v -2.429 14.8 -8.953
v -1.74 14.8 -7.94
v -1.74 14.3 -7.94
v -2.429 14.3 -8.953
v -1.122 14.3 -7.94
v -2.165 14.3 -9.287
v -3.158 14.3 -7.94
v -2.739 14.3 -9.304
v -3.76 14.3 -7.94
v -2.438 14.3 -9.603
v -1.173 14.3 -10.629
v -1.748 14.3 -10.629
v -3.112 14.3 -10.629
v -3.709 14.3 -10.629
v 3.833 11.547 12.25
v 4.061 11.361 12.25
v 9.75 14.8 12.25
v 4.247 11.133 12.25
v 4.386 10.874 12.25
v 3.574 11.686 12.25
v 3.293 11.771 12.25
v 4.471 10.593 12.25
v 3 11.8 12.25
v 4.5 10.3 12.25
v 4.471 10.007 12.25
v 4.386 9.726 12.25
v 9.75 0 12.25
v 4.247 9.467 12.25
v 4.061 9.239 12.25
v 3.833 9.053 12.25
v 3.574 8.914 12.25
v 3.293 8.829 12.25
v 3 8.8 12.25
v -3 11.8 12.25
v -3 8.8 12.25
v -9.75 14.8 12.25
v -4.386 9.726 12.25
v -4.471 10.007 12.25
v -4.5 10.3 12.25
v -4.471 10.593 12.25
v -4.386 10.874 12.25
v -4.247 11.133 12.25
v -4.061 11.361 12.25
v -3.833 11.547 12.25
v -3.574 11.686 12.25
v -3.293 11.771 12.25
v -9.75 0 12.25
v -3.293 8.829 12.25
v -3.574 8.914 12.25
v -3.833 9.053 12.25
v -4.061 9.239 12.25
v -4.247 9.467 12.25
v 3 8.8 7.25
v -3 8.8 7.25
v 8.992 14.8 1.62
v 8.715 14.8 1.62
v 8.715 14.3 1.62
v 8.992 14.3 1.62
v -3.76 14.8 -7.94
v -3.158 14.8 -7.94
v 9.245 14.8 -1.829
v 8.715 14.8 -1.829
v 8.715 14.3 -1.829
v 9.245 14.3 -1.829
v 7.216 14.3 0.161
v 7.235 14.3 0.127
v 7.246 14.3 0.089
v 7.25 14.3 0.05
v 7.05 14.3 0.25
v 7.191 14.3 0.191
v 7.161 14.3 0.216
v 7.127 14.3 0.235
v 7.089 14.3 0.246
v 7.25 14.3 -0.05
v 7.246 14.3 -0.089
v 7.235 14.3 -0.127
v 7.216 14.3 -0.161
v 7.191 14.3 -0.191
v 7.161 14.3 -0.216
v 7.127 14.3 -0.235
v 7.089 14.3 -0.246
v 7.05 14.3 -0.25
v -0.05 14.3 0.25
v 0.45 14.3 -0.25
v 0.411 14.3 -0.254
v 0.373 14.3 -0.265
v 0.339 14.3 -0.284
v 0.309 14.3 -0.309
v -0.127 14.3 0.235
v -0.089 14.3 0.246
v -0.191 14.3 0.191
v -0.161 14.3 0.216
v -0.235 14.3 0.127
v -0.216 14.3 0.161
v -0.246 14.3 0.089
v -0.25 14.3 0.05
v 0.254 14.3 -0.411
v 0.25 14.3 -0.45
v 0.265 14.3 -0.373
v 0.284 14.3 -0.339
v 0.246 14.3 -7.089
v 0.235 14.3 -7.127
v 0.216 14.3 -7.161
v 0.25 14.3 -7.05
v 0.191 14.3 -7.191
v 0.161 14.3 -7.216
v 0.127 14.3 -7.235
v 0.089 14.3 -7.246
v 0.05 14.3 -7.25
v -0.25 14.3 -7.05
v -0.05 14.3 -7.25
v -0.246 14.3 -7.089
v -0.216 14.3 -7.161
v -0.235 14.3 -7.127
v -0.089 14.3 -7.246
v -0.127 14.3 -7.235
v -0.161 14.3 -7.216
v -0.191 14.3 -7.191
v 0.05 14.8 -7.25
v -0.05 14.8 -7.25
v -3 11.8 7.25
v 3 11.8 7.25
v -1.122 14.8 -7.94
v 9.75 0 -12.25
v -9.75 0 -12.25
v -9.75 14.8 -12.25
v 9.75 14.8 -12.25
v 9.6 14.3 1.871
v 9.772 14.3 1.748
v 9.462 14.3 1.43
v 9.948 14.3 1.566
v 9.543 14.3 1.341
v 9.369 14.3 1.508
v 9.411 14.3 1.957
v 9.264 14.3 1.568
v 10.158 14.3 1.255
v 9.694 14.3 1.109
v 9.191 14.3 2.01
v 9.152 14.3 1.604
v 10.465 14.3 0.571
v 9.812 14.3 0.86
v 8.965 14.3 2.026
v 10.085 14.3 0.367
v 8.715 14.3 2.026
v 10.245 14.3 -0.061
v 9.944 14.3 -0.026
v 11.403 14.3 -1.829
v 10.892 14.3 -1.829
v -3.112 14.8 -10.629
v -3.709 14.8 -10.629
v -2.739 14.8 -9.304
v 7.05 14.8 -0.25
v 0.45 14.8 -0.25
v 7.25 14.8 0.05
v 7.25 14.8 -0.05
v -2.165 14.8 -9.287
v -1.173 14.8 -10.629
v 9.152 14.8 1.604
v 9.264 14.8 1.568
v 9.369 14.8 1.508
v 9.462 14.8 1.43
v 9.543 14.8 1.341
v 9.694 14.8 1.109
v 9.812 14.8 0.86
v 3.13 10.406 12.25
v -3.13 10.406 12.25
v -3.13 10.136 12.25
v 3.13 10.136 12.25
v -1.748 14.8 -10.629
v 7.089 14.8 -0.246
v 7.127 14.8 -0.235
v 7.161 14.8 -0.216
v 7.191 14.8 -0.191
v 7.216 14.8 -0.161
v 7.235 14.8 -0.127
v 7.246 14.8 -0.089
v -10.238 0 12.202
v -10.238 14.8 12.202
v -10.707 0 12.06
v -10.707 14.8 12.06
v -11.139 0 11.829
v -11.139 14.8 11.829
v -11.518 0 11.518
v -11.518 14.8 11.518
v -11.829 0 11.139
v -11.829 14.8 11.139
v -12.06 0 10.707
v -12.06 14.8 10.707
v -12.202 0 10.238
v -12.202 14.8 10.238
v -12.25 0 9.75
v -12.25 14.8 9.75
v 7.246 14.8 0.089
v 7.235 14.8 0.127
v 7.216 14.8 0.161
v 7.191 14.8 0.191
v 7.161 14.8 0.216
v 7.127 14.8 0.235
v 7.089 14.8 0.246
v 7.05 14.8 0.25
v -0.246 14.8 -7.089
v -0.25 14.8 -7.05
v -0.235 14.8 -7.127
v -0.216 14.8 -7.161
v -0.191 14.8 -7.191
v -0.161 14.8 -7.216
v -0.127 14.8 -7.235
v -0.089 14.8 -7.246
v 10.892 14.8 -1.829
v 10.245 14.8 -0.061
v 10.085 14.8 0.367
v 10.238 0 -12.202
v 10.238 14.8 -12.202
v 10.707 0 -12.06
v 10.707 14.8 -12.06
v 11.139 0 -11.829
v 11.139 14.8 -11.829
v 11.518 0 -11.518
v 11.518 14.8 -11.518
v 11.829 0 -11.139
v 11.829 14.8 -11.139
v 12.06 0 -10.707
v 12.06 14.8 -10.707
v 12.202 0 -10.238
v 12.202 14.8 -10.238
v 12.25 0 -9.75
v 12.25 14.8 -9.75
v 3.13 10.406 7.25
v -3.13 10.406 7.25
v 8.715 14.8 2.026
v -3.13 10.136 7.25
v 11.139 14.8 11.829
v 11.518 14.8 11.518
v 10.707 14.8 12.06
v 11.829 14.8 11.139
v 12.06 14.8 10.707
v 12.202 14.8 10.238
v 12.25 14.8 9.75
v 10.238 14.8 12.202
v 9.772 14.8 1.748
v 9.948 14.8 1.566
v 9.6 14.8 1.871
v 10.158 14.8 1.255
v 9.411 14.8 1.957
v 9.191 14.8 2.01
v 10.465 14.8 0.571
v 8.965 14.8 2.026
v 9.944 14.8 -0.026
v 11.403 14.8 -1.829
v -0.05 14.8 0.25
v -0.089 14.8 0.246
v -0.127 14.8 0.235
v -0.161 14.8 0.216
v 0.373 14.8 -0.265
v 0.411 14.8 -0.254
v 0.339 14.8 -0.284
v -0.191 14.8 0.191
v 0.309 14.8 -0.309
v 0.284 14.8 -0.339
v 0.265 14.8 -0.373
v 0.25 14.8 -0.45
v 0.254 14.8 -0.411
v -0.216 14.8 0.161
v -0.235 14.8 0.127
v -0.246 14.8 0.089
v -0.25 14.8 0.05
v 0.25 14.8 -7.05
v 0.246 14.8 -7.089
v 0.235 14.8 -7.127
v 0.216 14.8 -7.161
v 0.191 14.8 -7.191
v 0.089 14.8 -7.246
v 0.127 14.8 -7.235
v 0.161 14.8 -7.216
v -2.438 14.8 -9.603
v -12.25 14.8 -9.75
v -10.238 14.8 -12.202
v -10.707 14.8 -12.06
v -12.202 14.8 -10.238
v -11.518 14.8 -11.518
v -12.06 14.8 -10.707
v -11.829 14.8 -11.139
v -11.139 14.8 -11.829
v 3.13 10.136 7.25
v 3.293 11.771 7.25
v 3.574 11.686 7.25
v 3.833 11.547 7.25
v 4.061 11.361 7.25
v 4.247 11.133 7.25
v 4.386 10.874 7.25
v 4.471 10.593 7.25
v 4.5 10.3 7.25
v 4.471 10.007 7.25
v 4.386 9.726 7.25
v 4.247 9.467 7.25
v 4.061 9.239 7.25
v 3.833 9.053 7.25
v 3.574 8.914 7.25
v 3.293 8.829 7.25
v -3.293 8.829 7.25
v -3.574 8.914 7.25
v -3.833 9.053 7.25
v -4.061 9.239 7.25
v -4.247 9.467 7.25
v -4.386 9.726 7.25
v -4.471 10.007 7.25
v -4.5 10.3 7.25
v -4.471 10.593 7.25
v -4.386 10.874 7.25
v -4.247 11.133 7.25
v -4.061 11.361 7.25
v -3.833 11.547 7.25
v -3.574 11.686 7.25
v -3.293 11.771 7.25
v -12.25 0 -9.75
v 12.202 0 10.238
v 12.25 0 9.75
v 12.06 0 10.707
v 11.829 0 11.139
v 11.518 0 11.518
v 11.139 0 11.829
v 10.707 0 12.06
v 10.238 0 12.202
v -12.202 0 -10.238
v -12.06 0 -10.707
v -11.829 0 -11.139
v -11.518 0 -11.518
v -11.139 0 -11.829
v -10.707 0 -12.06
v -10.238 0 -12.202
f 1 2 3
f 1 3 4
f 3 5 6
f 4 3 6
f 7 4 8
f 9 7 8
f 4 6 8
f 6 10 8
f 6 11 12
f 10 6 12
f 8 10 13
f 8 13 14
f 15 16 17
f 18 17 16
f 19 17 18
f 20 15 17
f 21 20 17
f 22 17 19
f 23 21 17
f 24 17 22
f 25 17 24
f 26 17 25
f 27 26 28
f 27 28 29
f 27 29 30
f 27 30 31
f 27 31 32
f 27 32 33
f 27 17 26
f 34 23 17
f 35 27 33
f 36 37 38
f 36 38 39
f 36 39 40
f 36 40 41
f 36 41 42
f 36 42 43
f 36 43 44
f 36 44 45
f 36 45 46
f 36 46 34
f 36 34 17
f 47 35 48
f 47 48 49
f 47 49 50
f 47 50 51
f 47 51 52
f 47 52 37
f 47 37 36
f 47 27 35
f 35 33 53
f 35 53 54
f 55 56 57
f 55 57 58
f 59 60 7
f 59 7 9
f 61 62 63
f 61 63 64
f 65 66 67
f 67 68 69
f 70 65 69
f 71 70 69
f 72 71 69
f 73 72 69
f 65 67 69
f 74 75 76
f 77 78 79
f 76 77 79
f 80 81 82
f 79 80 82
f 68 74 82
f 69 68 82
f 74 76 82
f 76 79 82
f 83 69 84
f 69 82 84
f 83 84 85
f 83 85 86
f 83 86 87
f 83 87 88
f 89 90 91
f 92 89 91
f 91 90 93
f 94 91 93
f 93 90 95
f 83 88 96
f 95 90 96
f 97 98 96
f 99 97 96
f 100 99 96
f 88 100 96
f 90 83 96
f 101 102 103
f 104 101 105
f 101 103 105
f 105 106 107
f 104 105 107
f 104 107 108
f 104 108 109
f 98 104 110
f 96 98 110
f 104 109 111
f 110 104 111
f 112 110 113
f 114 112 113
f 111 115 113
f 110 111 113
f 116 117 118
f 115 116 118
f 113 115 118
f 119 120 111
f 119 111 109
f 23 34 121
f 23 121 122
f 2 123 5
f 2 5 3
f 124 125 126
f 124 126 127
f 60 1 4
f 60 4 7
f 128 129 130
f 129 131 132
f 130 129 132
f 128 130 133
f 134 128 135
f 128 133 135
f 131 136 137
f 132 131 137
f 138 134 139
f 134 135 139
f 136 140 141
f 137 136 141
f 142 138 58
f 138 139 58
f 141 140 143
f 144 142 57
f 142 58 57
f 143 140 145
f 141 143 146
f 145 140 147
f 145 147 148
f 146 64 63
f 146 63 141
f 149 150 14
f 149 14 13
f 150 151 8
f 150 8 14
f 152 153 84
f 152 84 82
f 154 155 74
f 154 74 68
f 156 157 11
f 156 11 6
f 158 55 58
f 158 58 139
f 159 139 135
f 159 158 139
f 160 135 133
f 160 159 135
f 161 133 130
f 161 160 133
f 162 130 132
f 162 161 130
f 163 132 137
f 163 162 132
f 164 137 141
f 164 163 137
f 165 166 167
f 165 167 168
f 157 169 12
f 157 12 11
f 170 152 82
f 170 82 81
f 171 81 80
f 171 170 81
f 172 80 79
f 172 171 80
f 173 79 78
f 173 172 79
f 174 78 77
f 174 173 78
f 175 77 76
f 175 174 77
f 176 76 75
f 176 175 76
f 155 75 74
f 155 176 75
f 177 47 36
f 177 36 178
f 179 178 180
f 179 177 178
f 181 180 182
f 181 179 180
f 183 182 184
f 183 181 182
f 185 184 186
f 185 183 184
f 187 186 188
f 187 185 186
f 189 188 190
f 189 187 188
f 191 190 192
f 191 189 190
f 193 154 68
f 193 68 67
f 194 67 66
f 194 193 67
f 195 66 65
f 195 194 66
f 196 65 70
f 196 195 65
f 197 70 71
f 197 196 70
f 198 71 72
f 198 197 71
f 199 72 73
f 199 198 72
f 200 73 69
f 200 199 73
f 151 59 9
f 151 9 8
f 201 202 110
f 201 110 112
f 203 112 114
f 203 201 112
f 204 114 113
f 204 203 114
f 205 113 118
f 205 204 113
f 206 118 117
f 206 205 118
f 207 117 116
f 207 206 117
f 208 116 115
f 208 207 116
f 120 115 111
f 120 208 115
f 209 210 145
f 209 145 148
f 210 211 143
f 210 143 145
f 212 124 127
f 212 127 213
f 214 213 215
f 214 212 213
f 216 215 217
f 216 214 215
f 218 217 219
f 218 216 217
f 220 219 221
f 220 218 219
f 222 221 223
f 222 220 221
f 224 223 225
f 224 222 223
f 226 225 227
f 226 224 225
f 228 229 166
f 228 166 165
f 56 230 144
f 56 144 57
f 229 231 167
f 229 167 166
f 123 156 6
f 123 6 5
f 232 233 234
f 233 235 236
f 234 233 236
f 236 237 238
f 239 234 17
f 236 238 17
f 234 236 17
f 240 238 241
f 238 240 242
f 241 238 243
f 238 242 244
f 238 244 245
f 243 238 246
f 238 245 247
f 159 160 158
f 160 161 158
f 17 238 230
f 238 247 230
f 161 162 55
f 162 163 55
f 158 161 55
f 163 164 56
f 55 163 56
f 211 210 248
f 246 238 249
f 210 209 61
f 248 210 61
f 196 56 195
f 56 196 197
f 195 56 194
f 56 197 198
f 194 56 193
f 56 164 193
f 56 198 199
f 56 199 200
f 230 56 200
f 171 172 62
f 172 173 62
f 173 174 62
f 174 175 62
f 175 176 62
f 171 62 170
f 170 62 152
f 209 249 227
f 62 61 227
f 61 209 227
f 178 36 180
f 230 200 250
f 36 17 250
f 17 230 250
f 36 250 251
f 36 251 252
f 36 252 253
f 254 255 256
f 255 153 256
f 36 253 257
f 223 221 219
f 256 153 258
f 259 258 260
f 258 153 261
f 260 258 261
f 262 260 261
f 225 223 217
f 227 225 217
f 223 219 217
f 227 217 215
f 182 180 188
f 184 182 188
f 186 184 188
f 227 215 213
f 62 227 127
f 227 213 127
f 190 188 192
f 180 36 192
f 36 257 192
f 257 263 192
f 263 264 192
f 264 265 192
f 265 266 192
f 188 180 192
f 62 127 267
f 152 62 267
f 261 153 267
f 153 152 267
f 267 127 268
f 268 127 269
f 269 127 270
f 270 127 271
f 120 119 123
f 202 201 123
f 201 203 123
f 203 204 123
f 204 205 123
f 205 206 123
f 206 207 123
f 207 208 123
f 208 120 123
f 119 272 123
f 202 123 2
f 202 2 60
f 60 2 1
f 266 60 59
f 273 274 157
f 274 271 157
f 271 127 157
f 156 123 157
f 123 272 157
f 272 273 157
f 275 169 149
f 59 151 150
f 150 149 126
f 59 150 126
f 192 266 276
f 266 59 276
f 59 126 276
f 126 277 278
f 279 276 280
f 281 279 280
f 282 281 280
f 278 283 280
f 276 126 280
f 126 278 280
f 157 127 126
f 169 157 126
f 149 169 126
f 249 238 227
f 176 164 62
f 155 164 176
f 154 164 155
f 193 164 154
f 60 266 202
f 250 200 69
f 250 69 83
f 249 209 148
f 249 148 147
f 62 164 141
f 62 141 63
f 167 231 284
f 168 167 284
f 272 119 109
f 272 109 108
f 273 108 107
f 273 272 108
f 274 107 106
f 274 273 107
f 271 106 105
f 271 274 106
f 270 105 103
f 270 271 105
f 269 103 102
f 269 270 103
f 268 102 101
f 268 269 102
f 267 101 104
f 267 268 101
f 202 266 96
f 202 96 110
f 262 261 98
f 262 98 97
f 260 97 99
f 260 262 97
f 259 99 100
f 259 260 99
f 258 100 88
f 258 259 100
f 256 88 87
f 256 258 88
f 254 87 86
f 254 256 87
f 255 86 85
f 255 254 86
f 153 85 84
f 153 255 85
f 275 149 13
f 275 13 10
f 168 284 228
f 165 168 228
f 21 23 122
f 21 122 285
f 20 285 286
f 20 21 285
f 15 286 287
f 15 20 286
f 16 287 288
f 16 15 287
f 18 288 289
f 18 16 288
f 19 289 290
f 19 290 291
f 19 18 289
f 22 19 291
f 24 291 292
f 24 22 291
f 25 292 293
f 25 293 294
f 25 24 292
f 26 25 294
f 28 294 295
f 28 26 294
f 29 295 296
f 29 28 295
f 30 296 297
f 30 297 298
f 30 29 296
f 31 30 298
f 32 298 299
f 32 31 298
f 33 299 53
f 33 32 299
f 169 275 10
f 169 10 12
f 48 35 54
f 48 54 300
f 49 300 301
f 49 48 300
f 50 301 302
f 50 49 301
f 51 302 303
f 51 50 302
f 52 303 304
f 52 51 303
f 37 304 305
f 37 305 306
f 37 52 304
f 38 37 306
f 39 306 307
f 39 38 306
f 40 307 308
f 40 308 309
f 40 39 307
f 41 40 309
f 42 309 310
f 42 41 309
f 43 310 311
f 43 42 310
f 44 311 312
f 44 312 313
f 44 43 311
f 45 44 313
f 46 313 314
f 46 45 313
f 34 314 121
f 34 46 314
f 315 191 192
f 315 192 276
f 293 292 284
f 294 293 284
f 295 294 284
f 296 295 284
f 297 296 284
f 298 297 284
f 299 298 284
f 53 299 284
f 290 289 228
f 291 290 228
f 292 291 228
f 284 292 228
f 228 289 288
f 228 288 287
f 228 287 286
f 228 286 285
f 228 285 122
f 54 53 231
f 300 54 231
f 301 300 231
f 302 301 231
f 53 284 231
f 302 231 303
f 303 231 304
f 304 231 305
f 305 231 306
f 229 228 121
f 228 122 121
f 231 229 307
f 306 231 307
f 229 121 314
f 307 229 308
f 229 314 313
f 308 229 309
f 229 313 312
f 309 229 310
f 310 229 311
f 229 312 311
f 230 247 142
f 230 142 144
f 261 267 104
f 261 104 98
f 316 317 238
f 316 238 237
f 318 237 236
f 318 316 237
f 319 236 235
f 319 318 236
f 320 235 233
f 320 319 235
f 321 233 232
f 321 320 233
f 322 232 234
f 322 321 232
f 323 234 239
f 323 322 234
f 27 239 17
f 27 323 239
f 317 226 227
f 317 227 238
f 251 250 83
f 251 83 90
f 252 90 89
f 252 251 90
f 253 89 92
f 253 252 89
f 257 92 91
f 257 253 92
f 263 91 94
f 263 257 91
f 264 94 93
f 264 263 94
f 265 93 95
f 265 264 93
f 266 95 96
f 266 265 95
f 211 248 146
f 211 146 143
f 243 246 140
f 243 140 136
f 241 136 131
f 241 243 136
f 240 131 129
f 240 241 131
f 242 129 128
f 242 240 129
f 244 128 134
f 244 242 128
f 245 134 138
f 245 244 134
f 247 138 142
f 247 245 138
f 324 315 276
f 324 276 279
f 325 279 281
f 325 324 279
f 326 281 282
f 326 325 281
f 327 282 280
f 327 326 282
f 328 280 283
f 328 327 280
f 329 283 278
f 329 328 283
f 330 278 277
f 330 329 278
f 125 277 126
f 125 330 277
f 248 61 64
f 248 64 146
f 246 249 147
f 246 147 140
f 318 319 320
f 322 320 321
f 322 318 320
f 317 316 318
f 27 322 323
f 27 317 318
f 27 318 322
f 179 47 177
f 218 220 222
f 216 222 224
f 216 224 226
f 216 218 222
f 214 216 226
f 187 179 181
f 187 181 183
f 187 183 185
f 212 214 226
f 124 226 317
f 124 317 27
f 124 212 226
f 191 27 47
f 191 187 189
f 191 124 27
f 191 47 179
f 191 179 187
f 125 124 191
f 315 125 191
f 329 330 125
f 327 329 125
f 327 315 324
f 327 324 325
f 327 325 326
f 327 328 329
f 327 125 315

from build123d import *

# Parameters (mm, degrees)
EXTRUDE_1_DEPTH     = 14.8
CUT_EXTRUDE_1_DEPTH = 0.5
CUT_EXTRUDE_2_DEPTH = 0.5
CUT_EXTRUDE_3_DEPTH = 0.5
CUT_EXTRUDE_4_DEPTH = 5
SKETCH_6_W          = 6.25953497
SKETCH_6_H          = 0.270195754
EXTRUDE_2_DEPTH     = 5


with BuildPart() as part:
    # 草图1 → 凸台-拉伸1 (new body)
    with BuildSketch(Plane(origin=(0, 0, 0), x_dir=(1, 0, 0), z_dir=(0, 1, 0))):
        with BuildLine():
            Line((-9.75, 12.25), (9.75, 12.25))
            ThreePointArc((9.75, 12.25), (11.517766953, 11.517766953), (12.25, 9.75))
            Line((12.25, 9.75), (12.25, -9.75))
            ThreePointArc((12.25, -9.75), (11.517766953, -11.517766953), (9.75, -12.25))
            Line((9.75, -12.25), (-9.75, -12.25))
            ThreePointArc((-9.75, -12.25), (-11.517766953, -11.517766953), (-12.25, -9.75))
            Line((-12.25, -9.75), (-12.25, 9.75))
            ThreePointArc((-12.25, 9.75), (-11.517766953, 11.517766953), (-9.75, 12.25))
        make_face()
    extrude(amount=EXTRUDE_1_DEPTH)

    # 草图2 → 切除-拉伸1 (cut)
    with BuildSketch(Plane(origin=(0, 14.8, 0), x_dir=(1, 0, 0), z_dir=(0, 1, 0))):
        with BuildLine():
            Line((-0.25, -0.05), (-0.25, 7.05))
            ThreePointArc((-0.25, 7.05), (-0.191421356, 7.191421356), (-0.05, 7.25))
            Line((-0.05, 7.25), (0.05, 7.25))
            ThreePointArc((0.05, 7.25), (0.191421356, 7.191421356), (0.25, 7.05))
            Line((0.25, 7.05), (0.25, 0.45))
            ThreePointArc((0.25, 0.45), (0.308578644, 0.308578644), (0.45, 0.25))
            Line((0.45, 0.25), (7.05, 0.25))
            ThreePointArc((7.05, 0.25), (7.191421356, 0.191421356), (7.25, 0.05))
            Line((7.25, 0.05), (7.25, -0.05))
            ThreePointArc((7.25, -0.05), (7.191421356, -0.191421356), (7.05, -0.25))
            Line((7.05, -0.25), (-0.05, -0.25))
            ThreePointArc((-0.05, -0.25), (-0.191421356, -0.191421356), (-0.25, -0.05))
        make_face()
    extrude(amount=-CUT_EXTRUDE_1_DEPTH, mode=Mode.SUBTRACT)

    # 草图3 → 切除-拉伸2 (cut)
    with BuildSketch(Plane(origin=(0, 14.8, 0), x_dir=(1, 0, 0), z_dir=(0, 1, 0))):
        Polygon((-1.12229135, 7.940311498), (-1.739705299, 7.940311498), (-2.429243342, 8.953219107), (-3.157617436, 7.940311498), (-3.759972509, 7.940311498), (-2.739139176, 9.303536136), (-3.709247871, 10.628717295), (-3.112440806, 10.628717295), (-2.437961639, 9.603128527), (-1.747631023, 10.628717295), (-1.173015987, 10.628717295), (-2.164524139, 9.286892114), align=None)
    extrude(amount=-CUT_EXTRUDE_2_DEPTH, mode=Mode.SUBTRACT)

    # 草图4 → 切除-拉伸3 (cut)
    with BuildSketch(Plane(origin=(0, 14.8, 0), x_dir=(1, 0, 0), z_dir=(0, 1, 0))):
        with BuildLine():
            Line((11.403475674, 1.828812442), (10.465069877, -0.571096978))
            add(Edge.make_bspline(
                [(10.465069877, -0.571096978), (10.441698651, -0.632813146), (10.396273738, -0.752766273), (10.323476502, -0.924688355), (10.248962895, -1.083206918), (10.173859339, -1.229075957), (10.096249765, -1.36191233), (10.015608226, -1.4823536), (9.930382332, -1.589561424), (9.842668967, -1.685533109), (9.749809923, -1.768599434), (9.653342166, -1.840372882), (9.551769454, -1.8996192), (9.445588671, -1.946527543), (9.334028283, -1.98269443), (9.216553101, -2.007284146), (9.092822913, -2.024191262), (9.008117337, -2.025559298), (8.964730203, -2.026260022)],
                knots=[0, 0, 0, 0, 0.000197967, 0.000384774, 0.000559923, 0.000723343, 0.00087681, 0.001021234, 0.001157764, 0.001287322, 0.001410801, 0.001530959, 0.001647456, 0.001762775, 0.001878572, 0.001998583, 0.00212245, 0.002252519, 0.002252519, 0.002252519, 0.002252519], degree=3))
            add(Edge.make_bspline(
                [(8.964730203, -2.026260022), (8.942538174, -2.026260022), (8.900531833, -2.026260022), (8.838975372, -2.026260022), (8.777947292, -2.026260022), (8.736733524, -2.026260022), (8.715069877, -2.026260022)],
                knots=[0, 0, 0, 0, 6.6576e-05, 0.000126019, 0.000184669, 0.00024966, 0.00024966, 0.00024966, 0.00024966], degree=3))
            Line((8.715069877, -2.026260022), (8.715069877, -1.62046292))
            add(Edge.make_bspline(
                [(8.715069877, -1.62046292), (8.735676761, -1.62046292), (8.778739865, -1.62046292), (8.845844333, -1.62046292), (8.917440046, -1.62046292), (8.966579539, -1.62046292), (8.991677667, -1.62046292)],
                knots=[0, 0, 0, 0, 6.1821e-05, 0.000129189, 0.000201313, 0.000276608, 0.000276608, 0.000276608, 0.000276608], degree=3))
            add(Edge.make_bspline(
                [(8.991677667, -1.62046292), (9.033605397, -1.618534602), (9.115432431, -1.614771255), (9.214758532, -1.588635211), (9.288887696, -1.557320953), (9.342163605, -1.526264237), (9.395038901, -1.491140236), (9.444860635, -1.447343482), (9.494119782, -1.39811915), (9.542666617, -1.342303846), (9.589955098, -1.279758499), (9.636344058, -1.210191532), (9.680981598, -1.132997619), (9.726689194, -1.049181552), (9.769706918, -0.956871513), (9.797608369, -0.892680567), (9.811990167, -0.859593355)],
                knots=[0, 0, 0, 0, 0.00012565, 0.00024522, 0.000305581, 0.00036663, 0.000429941, 0.000495706, 0.000565199, 0.000638789, 0.000717414, 0.000800286, 0.000889457, 0.000984846, 0.001086595, 0.001194832, 0.001194832, 0.001194832, 0.001194832], degree=3))
            Line((9.811990167, -0.859593355), (8.715069877, 1.828812442))
            Line((8.715069877, 1.828812442), (9.244508282, 1.828812442))
            Line((9.244508282, 1.828812442), (9.944349768, 0.025710087))
            Line((9.944349768, 0.025710087), (10.084635094, -0.366613282))
            Line((10.084635094, -0.366613282), (10.244734732, 0.061375848))
            Line((10.244734732, 0.061375848), (10.892266435, 1.828812442))
            Line((10.892266435, 1.828812442), (11.403475674, 1.828812442))
        make_face()
    extrude(amount=-CUT_EXTRUDE_3_DEPTH, mode=Mode.SUBTRACT)

    # 草图5 → 切除-拉伸4 (cut)
    with BuildSketch(Plane.XY.offset(12.25)):
        with BuildLine():
            Line((-3, 11.8), (3, 11.8))
            ThreePointArc((3, 11.8), (4.5, 10.3), (3, 8.8))
            Line((3, 8.8), (-3, 8.8))
            ThreePointArc((-3, 8.8), (-4.5, 10.3), (-3, 11.8))
        make_face()
    extrude(amount=-CUT_EXTRUDE_4_DEPTH, mode=Mode.SUBTRACT)

    # 草图6 → 凸台-拉伸2 (add)
    with BuildSketch(Plane.XY.offset(7.25)):
        with Locations((0, 10.270829887)):
            Rectangle(SKETCH_6_W, SKETCH_6_H)
    extrude(amount=EXTRUDE_2_DEPTH)


solid = part.part
